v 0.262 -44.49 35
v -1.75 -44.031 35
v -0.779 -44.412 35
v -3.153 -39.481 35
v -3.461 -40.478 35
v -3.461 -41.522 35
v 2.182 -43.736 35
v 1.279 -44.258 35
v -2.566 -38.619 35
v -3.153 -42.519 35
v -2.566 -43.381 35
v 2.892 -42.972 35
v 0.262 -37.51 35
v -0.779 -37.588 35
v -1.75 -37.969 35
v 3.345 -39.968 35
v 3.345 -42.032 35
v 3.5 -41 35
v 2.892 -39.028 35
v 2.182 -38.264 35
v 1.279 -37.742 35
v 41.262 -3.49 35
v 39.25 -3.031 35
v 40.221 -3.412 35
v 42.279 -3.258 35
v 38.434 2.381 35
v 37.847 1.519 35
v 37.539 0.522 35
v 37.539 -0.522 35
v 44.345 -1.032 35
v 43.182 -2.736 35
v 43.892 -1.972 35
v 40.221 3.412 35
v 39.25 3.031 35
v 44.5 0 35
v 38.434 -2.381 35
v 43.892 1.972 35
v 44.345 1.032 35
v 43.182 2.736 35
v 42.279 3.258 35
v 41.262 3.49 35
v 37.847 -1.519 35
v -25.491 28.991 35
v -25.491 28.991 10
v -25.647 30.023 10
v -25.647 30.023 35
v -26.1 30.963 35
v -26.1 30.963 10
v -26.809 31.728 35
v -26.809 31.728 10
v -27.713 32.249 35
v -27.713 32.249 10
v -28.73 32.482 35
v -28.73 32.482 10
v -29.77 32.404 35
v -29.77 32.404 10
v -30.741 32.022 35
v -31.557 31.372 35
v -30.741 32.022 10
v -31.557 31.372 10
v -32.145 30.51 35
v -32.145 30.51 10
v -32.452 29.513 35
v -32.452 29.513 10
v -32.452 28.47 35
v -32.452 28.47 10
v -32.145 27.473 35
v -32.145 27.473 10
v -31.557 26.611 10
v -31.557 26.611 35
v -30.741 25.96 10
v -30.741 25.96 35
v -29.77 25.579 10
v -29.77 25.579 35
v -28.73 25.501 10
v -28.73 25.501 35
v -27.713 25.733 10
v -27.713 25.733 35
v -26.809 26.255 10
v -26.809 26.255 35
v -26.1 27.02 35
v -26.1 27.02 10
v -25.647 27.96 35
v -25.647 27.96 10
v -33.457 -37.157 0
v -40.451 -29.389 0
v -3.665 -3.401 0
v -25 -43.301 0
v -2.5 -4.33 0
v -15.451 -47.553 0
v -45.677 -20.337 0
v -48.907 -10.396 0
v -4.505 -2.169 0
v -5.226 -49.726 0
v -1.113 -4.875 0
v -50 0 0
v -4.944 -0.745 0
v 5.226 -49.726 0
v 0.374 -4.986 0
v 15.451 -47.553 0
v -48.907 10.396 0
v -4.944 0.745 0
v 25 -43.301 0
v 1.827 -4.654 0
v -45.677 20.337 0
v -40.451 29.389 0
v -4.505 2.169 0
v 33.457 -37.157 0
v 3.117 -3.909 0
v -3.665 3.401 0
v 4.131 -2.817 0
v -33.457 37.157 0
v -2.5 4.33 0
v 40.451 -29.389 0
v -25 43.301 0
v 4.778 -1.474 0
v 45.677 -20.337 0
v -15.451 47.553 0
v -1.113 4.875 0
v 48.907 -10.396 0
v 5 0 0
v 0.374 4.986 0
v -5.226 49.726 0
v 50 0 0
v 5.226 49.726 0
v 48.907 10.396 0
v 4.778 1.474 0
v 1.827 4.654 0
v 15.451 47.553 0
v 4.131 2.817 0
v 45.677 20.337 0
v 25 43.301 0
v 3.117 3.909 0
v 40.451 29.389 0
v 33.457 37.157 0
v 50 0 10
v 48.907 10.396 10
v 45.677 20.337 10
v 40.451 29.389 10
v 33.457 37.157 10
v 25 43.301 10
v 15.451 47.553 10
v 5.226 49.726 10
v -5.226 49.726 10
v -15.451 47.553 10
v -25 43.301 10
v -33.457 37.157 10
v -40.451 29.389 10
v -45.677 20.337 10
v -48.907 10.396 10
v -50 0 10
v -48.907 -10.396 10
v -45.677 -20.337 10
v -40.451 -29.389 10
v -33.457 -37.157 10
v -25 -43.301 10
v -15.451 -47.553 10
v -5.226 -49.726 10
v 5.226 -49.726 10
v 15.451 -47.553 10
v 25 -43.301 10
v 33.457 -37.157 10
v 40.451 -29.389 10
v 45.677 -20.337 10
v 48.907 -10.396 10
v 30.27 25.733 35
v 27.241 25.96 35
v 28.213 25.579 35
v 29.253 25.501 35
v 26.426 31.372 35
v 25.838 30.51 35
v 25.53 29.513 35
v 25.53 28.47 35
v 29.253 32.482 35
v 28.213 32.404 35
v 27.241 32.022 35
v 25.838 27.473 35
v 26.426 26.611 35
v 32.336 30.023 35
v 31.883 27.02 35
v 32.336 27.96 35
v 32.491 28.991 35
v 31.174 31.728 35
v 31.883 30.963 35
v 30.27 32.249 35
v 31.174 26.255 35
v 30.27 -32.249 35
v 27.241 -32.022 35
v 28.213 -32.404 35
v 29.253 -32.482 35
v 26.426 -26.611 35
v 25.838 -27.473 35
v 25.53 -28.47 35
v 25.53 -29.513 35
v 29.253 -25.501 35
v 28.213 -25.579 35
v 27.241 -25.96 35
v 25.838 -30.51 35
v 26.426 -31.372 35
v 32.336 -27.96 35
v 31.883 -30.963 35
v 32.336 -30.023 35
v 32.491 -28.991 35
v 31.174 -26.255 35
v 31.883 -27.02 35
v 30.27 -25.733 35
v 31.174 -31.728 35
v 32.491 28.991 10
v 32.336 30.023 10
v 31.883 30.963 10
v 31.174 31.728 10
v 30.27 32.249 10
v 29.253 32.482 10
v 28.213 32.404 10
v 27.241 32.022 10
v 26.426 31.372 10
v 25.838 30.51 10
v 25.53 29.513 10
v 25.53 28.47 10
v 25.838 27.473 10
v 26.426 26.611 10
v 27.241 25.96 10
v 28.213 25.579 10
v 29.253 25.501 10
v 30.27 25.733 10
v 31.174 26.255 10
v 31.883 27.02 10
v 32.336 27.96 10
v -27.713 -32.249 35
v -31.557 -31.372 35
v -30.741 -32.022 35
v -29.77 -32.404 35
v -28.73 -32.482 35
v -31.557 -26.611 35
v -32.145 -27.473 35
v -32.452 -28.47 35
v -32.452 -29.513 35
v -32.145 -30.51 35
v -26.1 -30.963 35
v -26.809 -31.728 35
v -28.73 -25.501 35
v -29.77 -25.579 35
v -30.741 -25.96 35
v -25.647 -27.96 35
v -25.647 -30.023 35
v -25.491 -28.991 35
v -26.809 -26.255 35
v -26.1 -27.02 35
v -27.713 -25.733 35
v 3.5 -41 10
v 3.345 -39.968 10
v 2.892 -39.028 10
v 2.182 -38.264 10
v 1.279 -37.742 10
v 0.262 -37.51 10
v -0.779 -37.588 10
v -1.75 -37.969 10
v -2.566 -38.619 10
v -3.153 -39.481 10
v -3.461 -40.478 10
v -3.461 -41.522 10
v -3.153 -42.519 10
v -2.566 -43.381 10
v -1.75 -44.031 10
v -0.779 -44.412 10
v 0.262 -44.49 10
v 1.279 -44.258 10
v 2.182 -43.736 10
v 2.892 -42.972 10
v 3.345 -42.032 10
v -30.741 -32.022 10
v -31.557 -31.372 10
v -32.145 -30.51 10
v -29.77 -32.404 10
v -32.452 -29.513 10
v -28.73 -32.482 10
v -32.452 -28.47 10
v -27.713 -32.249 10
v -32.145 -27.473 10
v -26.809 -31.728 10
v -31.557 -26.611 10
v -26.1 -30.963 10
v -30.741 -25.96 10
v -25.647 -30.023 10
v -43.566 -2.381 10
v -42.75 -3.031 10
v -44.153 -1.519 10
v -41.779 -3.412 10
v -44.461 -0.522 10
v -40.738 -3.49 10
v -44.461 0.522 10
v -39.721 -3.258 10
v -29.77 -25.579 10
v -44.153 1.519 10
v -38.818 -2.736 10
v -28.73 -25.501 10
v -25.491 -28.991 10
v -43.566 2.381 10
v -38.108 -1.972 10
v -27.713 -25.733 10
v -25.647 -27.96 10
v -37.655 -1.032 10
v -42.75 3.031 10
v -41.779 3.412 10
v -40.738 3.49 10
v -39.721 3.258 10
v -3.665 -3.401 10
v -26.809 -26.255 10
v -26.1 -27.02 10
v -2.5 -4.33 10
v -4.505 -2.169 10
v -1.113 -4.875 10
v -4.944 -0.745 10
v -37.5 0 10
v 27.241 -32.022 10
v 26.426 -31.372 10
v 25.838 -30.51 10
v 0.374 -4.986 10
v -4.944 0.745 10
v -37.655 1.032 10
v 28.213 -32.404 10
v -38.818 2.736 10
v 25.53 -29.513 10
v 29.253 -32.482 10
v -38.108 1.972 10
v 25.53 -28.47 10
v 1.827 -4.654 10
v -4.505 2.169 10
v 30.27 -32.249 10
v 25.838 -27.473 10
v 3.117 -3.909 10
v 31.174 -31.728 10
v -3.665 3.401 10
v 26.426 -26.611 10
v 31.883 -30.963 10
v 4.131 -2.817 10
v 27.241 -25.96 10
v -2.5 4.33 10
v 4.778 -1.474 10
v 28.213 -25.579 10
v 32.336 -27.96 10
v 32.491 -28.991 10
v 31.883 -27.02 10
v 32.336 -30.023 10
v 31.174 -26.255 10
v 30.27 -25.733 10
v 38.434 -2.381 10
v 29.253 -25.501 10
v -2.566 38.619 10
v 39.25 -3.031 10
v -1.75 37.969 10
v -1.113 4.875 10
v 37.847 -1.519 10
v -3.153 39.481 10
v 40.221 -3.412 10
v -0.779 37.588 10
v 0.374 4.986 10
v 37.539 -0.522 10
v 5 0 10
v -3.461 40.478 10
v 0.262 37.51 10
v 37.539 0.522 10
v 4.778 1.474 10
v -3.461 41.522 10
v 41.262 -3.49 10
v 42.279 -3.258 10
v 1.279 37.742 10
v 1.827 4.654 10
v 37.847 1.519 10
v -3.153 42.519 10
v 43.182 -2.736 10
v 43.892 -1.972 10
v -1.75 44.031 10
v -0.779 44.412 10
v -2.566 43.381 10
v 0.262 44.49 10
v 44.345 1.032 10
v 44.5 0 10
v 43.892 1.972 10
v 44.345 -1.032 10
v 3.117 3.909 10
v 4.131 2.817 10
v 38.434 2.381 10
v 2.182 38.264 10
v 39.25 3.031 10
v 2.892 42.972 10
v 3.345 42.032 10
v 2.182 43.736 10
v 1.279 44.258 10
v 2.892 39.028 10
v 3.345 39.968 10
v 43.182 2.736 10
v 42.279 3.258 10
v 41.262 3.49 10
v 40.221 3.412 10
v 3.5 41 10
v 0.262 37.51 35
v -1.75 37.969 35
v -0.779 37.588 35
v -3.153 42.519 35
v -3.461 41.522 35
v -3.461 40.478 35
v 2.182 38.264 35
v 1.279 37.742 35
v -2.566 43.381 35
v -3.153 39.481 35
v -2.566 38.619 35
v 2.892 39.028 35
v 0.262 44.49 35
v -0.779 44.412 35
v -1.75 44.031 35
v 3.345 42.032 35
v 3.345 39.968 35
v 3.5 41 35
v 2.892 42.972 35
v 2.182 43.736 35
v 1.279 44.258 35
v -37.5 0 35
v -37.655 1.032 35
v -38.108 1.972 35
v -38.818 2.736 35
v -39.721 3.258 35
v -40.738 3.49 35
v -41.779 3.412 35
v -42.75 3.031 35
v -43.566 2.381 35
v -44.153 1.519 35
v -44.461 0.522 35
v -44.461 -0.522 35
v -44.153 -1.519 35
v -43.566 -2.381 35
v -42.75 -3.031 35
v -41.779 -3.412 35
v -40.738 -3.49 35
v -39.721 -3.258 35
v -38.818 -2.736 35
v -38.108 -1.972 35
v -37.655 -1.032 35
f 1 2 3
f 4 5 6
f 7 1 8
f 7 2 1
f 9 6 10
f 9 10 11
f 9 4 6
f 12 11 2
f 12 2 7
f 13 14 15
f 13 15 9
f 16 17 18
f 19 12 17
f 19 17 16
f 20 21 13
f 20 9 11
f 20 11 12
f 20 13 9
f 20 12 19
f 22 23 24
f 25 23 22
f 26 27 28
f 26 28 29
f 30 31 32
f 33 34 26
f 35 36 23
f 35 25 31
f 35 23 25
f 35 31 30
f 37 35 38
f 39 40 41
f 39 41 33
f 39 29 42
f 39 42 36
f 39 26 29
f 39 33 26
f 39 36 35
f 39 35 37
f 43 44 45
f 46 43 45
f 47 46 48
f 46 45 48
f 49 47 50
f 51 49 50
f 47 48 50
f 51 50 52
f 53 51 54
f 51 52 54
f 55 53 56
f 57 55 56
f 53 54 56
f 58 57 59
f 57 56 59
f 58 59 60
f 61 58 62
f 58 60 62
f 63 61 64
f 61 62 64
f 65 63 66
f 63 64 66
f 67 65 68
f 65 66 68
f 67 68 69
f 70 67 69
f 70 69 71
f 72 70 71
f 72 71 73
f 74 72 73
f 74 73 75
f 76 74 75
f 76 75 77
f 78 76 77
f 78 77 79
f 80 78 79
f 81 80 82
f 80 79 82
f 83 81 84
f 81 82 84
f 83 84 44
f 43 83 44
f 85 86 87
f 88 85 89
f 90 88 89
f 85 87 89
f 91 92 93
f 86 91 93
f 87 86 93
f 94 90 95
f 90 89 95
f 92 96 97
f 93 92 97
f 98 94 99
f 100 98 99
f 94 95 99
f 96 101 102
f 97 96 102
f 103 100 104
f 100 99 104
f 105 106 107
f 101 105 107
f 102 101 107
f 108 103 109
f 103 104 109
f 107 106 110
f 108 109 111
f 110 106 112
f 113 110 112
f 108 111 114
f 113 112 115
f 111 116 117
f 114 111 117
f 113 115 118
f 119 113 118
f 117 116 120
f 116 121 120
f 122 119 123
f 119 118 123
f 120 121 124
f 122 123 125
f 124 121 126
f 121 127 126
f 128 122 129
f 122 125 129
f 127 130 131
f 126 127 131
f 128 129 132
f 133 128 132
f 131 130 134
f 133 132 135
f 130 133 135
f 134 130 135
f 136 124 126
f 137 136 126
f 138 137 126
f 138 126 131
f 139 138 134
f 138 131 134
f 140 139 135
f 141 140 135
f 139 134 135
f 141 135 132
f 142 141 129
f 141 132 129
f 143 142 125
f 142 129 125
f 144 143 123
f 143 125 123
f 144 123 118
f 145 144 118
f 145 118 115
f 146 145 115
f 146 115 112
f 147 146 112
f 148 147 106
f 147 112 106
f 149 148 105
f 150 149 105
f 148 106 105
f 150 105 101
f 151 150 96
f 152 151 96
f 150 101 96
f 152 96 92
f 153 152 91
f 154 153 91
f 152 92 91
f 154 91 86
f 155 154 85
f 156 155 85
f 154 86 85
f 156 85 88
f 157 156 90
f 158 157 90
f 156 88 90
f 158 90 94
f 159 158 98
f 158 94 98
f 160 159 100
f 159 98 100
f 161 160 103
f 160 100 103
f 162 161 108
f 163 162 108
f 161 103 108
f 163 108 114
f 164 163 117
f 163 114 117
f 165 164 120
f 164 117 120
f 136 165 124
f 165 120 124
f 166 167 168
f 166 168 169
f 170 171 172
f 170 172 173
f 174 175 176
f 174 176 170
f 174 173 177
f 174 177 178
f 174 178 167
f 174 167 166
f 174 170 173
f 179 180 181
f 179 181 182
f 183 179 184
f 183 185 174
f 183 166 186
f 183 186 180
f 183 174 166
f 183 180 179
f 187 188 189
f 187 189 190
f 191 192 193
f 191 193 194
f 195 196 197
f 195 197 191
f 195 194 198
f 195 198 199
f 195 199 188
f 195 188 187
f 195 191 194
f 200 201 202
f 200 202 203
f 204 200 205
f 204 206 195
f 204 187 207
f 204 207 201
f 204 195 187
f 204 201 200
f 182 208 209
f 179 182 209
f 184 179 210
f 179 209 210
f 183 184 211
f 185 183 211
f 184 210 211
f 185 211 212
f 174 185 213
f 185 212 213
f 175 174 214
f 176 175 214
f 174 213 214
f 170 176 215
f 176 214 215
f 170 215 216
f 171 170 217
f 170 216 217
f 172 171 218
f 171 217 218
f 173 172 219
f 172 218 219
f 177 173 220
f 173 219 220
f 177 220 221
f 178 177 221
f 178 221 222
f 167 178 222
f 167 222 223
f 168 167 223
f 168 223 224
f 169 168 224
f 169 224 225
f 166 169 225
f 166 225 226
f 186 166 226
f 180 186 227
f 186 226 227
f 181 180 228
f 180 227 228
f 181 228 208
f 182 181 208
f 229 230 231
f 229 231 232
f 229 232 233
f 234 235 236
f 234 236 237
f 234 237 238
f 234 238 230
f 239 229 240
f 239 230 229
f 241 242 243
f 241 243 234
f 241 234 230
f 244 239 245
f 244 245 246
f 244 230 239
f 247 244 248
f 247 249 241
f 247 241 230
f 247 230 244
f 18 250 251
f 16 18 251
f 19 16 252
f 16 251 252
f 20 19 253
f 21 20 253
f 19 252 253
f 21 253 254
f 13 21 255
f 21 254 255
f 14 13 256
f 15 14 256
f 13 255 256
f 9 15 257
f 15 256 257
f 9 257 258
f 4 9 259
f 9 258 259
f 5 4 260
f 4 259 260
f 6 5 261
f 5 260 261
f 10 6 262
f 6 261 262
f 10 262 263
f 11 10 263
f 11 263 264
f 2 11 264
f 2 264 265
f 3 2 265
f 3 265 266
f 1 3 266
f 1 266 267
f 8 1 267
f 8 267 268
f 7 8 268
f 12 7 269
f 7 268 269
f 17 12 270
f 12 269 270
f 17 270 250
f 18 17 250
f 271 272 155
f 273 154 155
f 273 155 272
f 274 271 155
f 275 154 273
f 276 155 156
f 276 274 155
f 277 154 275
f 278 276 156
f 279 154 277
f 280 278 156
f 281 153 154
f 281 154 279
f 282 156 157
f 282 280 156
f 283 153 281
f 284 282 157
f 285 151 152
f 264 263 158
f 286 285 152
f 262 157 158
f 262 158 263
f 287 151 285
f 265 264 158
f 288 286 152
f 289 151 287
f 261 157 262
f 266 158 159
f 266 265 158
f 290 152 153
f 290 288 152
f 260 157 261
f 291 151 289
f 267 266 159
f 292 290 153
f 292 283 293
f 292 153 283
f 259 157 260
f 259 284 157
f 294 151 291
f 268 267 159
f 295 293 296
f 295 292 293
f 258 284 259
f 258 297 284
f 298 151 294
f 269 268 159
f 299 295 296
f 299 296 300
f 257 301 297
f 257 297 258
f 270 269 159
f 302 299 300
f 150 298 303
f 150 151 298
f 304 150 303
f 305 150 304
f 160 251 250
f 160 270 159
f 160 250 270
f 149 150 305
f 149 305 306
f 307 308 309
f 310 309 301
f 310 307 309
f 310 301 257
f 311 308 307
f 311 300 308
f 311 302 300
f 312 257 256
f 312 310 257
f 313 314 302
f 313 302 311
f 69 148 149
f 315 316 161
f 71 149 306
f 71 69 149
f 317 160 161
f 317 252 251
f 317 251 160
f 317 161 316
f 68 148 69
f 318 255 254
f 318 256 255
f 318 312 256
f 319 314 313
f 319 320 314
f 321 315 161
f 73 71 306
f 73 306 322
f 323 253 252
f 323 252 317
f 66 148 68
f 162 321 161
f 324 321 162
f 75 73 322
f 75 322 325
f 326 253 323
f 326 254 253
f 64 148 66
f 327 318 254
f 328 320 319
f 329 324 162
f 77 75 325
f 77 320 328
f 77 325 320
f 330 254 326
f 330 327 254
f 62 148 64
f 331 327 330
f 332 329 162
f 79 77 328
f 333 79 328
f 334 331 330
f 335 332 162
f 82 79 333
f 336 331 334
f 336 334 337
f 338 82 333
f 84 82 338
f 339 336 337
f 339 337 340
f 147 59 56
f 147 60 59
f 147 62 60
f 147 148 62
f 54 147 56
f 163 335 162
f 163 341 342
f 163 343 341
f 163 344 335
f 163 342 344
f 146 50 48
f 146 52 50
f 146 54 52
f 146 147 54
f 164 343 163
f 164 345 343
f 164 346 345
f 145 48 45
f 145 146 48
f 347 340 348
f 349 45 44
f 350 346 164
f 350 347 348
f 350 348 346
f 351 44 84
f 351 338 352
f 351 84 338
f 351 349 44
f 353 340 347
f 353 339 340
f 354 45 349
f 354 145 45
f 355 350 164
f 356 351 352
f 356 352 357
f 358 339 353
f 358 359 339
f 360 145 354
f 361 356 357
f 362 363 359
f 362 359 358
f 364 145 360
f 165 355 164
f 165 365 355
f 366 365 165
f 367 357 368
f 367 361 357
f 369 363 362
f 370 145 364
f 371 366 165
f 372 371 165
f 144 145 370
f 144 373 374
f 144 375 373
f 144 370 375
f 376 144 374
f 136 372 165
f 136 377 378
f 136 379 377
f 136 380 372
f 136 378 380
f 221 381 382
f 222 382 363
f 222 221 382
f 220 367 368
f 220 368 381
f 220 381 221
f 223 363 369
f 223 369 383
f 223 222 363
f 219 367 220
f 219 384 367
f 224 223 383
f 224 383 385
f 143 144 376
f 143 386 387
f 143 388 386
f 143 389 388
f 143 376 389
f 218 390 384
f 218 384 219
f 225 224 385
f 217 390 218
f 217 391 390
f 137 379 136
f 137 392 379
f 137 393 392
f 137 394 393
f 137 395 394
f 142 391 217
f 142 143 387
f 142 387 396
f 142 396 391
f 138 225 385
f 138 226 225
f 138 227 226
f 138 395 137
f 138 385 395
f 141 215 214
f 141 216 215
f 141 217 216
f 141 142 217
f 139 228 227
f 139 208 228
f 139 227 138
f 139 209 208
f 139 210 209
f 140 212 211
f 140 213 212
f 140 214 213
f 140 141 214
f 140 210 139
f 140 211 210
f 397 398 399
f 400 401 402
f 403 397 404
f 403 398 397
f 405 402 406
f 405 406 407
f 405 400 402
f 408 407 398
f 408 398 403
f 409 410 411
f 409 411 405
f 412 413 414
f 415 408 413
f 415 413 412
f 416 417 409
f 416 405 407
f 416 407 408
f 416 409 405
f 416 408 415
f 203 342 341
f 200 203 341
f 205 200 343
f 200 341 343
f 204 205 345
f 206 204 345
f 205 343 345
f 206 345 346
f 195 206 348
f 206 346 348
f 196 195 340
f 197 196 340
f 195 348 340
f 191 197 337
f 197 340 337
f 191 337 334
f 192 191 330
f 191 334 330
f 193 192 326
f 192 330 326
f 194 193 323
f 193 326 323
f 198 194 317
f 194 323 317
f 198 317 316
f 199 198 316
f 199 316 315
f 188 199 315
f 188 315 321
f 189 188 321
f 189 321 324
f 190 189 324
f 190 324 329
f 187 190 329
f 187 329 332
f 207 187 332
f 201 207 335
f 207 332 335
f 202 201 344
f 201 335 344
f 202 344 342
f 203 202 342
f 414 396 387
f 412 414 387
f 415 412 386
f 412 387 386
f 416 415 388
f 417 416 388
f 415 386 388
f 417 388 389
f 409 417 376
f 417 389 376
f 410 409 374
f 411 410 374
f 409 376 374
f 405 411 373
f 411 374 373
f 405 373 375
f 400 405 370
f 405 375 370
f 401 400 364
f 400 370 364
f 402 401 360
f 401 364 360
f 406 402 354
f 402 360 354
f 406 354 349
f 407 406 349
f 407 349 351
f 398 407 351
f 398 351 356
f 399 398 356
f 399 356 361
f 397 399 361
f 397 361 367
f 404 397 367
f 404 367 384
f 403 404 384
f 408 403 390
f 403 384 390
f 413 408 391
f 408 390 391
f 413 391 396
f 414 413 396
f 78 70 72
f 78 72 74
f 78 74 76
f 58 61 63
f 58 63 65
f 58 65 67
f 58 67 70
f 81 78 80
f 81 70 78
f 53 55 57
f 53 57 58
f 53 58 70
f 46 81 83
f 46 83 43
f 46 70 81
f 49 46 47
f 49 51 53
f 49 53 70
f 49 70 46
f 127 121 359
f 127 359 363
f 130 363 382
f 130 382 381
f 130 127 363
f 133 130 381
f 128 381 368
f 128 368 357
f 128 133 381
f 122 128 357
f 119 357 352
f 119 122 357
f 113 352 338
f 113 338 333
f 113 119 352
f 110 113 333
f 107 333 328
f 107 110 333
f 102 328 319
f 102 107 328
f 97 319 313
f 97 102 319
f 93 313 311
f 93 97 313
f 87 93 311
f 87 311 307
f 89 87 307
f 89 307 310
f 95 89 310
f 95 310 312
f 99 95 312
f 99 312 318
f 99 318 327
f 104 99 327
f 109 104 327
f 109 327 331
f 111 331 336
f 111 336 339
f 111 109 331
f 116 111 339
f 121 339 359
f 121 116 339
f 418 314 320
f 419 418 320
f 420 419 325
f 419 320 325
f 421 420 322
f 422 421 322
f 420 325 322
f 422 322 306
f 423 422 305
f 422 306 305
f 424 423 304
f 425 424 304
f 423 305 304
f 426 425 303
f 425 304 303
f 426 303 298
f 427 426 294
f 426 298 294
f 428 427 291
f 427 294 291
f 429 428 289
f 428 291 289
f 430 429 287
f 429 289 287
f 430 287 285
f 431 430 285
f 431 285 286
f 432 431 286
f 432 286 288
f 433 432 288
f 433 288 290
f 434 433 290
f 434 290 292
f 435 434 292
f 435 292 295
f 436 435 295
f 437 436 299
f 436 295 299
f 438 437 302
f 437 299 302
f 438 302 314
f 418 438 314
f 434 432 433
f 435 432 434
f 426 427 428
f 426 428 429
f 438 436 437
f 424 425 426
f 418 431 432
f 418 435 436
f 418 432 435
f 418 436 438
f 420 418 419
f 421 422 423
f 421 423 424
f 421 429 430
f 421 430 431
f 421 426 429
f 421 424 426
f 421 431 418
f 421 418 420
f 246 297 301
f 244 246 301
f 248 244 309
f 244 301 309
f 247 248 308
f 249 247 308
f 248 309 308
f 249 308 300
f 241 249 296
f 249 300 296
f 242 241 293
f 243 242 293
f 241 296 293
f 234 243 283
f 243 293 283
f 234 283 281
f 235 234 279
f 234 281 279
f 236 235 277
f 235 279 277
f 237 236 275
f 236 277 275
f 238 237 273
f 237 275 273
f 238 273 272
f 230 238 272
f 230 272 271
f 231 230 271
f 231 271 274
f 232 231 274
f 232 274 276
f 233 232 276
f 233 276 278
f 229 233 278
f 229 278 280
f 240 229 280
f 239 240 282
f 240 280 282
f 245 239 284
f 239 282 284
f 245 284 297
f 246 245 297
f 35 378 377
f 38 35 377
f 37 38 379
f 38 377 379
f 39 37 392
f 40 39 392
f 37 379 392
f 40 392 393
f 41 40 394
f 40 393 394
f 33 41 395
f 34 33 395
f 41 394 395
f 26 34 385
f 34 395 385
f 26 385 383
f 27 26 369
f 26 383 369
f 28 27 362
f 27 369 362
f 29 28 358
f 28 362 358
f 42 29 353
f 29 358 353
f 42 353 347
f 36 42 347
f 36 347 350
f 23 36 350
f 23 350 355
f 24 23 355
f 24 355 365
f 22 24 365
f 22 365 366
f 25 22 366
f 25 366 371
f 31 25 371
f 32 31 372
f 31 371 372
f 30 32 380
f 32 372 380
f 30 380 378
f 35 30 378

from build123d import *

# Parameters (mm, degrees)
SKETCH1_R           = 50
SKETCH1_R_2         = 5
BOSS_EXTRUDE1_DEPTH = 10
SKETCH2_R           = 3.5
BOSS_EXTRUDE2_DEPTH = 25


with BuildPart() as part:
    # Sketch1 → Boss-Extrude1 (new body)
    with BuildSketch(Plane.XY):
        Circle(SKETCH1_R)
        Circle(SKETCH1_R_2, mode=Mode.SUBTRACT)
    extrude(amount=BOSS_EXTRUDE1_DEPTH)

    # Sketch2 → Boss-Extrude2 (add)
    with BuildSketch(Plane.XY.offset(10)):
        with Locations((0, 41)):
            Circle(SKETCH2_R)
        with Locations((28.991378029, 28.991378029)):
            Circle(SKETCH2_R)
        with Locations((41, 0)):
            Circle(SKETCH2_R)
        with Locations((28.991378029, -28.991378029)):
            Circle(SKETCH2_R)
        with Locations((0, -41)):
            Circle(SKETCH2_R)
        with Locations((-28.991378029, -28.991378029)):
            Circle(SKETCH2_R)
        with Locations((-41, 0)):
            Circle(SKETCH2_R)
        with Locations((-28.991378029, 28.991378029)):
            Circle(SKETCH2_R)
    extrude(amount=BOSS_EXTRUDE2_DEPTH)


solid = part.part
